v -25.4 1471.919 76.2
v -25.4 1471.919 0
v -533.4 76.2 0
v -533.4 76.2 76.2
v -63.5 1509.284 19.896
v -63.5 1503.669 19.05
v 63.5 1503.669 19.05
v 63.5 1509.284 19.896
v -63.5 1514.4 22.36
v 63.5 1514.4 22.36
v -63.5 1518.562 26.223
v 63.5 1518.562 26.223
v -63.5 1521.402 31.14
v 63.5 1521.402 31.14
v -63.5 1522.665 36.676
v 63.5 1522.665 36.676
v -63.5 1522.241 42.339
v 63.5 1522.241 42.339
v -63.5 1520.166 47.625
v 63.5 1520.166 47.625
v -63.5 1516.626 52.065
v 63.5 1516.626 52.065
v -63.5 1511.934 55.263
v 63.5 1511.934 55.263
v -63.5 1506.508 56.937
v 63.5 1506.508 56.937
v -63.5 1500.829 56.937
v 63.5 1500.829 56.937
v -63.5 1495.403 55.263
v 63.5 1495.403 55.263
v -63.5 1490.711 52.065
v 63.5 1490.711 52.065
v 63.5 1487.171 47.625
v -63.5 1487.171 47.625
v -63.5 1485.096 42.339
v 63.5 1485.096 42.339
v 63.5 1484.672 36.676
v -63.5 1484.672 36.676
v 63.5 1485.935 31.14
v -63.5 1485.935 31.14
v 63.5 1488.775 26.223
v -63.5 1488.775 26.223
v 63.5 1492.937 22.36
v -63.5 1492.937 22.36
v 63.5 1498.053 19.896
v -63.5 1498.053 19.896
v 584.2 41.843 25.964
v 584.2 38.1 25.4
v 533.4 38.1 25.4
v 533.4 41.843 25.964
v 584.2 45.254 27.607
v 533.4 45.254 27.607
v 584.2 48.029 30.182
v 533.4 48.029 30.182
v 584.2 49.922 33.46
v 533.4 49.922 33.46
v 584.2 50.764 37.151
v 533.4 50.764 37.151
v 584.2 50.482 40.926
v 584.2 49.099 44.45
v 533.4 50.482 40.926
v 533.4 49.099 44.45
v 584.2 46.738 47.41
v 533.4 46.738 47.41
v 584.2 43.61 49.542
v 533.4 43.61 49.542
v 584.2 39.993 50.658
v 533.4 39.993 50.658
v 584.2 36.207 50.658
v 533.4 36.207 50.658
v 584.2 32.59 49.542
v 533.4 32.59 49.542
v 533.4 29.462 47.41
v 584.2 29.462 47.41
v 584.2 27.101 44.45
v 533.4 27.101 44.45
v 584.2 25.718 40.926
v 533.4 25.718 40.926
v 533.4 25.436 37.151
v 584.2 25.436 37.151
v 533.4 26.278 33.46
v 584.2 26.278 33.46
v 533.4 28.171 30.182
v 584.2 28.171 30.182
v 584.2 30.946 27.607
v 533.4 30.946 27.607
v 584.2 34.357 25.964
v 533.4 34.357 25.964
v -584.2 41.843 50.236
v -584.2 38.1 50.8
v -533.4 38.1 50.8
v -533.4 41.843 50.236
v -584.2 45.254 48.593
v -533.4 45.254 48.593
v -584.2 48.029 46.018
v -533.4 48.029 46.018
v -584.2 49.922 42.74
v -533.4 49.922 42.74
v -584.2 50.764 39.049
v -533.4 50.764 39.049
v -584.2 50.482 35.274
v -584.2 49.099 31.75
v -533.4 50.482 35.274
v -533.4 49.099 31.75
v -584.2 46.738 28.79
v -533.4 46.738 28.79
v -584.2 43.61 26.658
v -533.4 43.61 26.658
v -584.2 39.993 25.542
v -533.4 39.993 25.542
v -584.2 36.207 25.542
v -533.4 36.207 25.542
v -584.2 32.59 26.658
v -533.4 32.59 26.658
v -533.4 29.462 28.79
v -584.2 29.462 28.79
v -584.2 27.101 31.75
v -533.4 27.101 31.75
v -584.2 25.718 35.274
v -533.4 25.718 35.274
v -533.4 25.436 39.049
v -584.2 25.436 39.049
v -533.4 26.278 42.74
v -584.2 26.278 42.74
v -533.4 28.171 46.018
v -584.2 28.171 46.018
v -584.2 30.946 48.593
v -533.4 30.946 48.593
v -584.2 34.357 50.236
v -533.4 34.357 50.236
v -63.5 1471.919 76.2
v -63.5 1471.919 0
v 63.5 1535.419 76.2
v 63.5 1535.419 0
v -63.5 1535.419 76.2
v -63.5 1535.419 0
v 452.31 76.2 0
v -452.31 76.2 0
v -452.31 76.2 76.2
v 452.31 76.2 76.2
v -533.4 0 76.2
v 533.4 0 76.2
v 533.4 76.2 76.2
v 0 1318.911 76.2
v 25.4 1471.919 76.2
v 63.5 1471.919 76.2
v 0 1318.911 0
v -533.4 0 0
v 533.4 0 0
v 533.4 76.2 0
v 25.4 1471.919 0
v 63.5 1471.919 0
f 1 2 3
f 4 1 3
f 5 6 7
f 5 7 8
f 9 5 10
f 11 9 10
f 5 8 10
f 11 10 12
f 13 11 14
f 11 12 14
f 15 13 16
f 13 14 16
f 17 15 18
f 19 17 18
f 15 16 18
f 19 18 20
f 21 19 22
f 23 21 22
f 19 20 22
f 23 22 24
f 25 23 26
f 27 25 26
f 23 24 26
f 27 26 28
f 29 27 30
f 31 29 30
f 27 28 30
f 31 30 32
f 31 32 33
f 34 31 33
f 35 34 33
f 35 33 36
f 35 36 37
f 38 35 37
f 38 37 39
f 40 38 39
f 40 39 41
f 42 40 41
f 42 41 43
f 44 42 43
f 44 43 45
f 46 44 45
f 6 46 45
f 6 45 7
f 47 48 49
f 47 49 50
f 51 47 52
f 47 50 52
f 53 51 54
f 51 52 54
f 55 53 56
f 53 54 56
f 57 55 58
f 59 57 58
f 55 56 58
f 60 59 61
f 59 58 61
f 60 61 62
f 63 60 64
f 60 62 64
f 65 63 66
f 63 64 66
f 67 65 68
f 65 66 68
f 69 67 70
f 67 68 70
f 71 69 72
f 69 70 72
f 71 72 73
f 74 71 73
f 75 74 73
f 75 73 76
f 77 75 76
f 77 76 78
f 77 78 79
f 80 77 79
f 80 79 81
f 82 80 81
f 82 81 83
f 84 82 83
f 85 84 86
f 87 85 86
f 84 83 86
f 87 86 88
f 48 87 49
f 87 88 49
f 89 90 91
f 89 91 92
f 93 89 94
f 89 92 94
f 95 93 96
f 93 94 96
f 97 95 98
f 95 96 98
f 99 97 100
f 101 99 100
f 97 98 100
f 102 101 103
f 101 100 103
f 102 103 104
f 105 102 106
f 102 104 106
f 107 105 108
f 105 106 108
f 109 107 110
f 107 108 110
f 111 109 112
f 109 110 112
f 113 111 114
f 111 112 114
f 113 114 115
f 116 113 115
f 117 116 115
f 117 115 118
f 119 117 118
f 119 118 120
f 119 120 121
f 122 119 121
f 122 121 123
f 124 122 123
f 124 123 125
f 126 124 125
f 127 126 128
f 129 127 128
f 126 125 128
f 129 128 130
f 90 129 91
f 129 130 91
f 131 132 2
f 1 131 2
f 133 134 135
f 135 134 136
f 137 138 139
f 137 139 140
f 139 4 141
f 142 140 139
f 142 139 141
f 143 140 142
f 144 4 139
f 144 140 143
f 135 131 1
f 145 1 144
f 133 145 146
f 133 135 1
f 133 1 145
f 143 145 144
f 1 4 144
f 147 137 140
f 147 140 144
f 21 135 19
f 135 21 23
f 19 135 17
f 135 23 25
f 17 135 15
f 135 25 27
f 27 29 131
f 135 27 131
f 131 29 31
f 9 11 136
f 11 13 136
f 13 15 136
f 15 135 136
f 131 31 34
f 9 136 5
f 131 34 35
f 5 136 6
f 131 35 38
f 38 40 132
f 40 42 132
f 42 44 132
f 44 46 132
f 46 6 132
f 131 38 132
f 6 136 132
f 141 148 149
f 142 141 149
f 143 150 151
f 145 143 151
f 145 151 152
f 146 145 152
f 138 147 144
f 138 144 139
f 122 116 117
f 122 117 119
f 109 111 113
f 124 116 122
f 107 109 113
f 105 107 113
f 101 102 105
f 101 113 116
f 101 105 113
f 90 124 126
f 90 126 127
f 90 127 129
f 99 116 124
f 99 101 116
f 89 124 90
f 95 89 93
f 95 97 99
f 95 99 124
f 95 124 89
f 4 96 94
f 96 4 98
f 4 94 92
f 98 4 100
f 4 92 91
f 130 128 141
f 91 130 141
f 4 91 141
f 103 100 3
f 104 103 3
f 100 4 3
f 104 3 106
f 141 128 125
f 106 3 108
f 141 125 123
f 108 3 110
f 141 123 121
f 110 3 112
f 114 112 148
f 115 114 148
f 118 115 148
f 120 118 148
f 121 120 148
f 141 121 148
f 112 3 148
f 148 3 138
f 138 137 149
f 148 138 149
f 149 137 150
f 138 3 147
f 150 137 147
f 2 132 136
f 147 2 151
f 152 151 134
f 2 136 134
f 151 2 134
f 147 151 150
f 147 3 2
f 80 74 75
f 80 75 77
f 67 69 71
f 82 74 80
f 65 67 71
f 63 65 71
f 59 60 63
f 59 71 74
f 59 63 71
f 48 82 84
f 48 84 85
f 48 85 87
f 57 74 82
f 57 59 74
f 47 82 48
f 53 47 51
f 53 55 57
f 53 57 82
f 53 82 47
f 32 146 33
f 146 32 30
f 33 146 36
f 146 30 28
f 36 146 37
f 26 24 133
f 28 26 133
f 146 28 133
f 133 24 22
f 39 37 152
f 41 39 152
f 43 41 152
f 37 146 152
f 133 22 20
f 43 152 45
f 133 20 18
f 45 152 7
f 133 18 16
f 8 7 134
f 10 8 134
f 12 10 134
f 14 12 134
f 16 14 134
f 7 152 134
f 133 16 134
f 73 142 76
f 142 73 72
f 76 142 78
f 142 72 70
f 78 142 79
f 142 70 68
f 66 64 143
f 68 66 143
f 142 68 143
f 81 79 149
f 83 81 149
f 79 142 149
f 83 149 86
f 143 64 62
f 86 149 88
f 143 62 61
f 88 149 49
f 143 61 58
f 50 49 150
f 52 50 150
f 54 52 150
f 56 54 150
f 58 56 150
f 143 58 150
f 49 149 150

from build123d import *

# Parameters (mm, degrees)
BOSS_EXTRUDE1_DEPTH = 76.2
SKETCH2_R           = 19.05
CUT_EXTRUDE1_DEPTH  = 140.97
SKETCH3_R           = 12.7
BOSS_EXTRUDE2_DEPTH = 50.8
SKETCH4_R           = 12.7
BOSS_EXTRUDE3_DEPTH = 50.8


with BuildPart() as part:
    # Sketch1 → Boss-Extrude1 (new body)
    with BuildSketch(Plane.XY):
        Polygon((0, 0), (533.4, 0), (533.4, 76.2), (25.4, 1471.918529083), (63.5, 1471.918529083), (63.5, 1535.418529083), (-63.5, 1535.418529083), (-63.5, 1471.918529083), (-25.4, 1471.918529083), (-533.4, 76.2), (-533.4, 0), align=None)
        Polygon((-452.309653737, 76.2), (452.309653737, 76.2), (0, 1318.910560245), align=None, mode=Mode.SUBTRACT)
    extrude(amount=BOSS_EXTRUDE1_DEPTH)

    # Sketch2 → Cut-Extrude1 (cut)
    with BuildSketch(Plane(origin=(63.5, 0, 0), x_dir=(0, 0, -1), z_dir=(1, 0, 0))):
        with Locations((-38.1, 1503.668529083)):
            Circle(SKETCH2_R)
    extrude(amount=-CUT_EXTRUDE1_DEPTH, mode=Mode.SUBTRACT)

    # Sketch3 → Boss-Extrude2 (add)
    with BuildSketch(Plane.ZY.offset(533.4)):
        with Locations((38.1, 38.1)):
            Circle(SKETCH3_R)
    extrude(amount=BOSS_EXTRUDE2_DEPTH)

    # Sketch4 → Boss-Extrude3 (add)
    with BuildSketch(Plane(origin=(533.4, 0, 0), x_dir=(0, 0, -1), z_dir=(1, 0, 0))):
        with Locations((-38.1, 38.1)):
            Circle(SKETCH4_R)
    extrude(amount=BOSS_EXTRUDE3_DEPTH)


solid = part.part
